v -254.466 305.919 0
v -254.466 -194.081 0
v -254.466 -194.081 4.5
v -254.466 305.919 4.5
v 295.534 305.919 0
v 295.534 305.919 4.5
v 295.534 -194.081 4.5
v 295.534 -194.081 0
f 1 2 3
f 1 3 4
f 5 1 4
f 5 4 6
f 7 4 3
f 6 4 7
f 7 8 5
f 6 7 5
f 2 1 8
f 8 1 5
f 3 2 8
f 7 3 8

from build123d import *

# Parameters (mm, degrees)
F0_W     = 550
F0_H     = 500
F1_DEPTH = 4
F2_DEPTH = 0.5
F3_DEPTH = 0.5
F4_DEPTH = 0.5


with BuildPart() as f1:
    # F0 (on Top) → F1 (new body)
    with BuildSketch(Plane.XY):
        with Locations((20.5340534449, 55.919075012)):
            Rectangle(F0_W, F0_H)
    extrude(amount=F1_DEPTH)

    # F2 (add): a face of the model
    f2_faces = [f1.faces().sort_by_distance(p)[0] for p in [
        (20.5340534449, 55.919075012, 4),
    ]]
    extrude(f2_faces, amount=F2_DEPTH)

    # F3 (add): a face of the model
    f3_faces = [f1.faces().sort_by_distance(p)[0] for p in [
        (20.5340534449, 55.919075012, 4.5),
    ]]
    extrude(f3_faces, amount=F3_DEPTH)

    # F4 (cut): a face of the model
    f4_faces = [f1.faces().sort_by_distance(p)[0] for p in [
        (20.5340534449, 55.919075012, 5),
    ]]
    extrude(f4_faces, amount=-F4_DEPTH, mode=Mode.SUBTRACT)


solid = f1.part
